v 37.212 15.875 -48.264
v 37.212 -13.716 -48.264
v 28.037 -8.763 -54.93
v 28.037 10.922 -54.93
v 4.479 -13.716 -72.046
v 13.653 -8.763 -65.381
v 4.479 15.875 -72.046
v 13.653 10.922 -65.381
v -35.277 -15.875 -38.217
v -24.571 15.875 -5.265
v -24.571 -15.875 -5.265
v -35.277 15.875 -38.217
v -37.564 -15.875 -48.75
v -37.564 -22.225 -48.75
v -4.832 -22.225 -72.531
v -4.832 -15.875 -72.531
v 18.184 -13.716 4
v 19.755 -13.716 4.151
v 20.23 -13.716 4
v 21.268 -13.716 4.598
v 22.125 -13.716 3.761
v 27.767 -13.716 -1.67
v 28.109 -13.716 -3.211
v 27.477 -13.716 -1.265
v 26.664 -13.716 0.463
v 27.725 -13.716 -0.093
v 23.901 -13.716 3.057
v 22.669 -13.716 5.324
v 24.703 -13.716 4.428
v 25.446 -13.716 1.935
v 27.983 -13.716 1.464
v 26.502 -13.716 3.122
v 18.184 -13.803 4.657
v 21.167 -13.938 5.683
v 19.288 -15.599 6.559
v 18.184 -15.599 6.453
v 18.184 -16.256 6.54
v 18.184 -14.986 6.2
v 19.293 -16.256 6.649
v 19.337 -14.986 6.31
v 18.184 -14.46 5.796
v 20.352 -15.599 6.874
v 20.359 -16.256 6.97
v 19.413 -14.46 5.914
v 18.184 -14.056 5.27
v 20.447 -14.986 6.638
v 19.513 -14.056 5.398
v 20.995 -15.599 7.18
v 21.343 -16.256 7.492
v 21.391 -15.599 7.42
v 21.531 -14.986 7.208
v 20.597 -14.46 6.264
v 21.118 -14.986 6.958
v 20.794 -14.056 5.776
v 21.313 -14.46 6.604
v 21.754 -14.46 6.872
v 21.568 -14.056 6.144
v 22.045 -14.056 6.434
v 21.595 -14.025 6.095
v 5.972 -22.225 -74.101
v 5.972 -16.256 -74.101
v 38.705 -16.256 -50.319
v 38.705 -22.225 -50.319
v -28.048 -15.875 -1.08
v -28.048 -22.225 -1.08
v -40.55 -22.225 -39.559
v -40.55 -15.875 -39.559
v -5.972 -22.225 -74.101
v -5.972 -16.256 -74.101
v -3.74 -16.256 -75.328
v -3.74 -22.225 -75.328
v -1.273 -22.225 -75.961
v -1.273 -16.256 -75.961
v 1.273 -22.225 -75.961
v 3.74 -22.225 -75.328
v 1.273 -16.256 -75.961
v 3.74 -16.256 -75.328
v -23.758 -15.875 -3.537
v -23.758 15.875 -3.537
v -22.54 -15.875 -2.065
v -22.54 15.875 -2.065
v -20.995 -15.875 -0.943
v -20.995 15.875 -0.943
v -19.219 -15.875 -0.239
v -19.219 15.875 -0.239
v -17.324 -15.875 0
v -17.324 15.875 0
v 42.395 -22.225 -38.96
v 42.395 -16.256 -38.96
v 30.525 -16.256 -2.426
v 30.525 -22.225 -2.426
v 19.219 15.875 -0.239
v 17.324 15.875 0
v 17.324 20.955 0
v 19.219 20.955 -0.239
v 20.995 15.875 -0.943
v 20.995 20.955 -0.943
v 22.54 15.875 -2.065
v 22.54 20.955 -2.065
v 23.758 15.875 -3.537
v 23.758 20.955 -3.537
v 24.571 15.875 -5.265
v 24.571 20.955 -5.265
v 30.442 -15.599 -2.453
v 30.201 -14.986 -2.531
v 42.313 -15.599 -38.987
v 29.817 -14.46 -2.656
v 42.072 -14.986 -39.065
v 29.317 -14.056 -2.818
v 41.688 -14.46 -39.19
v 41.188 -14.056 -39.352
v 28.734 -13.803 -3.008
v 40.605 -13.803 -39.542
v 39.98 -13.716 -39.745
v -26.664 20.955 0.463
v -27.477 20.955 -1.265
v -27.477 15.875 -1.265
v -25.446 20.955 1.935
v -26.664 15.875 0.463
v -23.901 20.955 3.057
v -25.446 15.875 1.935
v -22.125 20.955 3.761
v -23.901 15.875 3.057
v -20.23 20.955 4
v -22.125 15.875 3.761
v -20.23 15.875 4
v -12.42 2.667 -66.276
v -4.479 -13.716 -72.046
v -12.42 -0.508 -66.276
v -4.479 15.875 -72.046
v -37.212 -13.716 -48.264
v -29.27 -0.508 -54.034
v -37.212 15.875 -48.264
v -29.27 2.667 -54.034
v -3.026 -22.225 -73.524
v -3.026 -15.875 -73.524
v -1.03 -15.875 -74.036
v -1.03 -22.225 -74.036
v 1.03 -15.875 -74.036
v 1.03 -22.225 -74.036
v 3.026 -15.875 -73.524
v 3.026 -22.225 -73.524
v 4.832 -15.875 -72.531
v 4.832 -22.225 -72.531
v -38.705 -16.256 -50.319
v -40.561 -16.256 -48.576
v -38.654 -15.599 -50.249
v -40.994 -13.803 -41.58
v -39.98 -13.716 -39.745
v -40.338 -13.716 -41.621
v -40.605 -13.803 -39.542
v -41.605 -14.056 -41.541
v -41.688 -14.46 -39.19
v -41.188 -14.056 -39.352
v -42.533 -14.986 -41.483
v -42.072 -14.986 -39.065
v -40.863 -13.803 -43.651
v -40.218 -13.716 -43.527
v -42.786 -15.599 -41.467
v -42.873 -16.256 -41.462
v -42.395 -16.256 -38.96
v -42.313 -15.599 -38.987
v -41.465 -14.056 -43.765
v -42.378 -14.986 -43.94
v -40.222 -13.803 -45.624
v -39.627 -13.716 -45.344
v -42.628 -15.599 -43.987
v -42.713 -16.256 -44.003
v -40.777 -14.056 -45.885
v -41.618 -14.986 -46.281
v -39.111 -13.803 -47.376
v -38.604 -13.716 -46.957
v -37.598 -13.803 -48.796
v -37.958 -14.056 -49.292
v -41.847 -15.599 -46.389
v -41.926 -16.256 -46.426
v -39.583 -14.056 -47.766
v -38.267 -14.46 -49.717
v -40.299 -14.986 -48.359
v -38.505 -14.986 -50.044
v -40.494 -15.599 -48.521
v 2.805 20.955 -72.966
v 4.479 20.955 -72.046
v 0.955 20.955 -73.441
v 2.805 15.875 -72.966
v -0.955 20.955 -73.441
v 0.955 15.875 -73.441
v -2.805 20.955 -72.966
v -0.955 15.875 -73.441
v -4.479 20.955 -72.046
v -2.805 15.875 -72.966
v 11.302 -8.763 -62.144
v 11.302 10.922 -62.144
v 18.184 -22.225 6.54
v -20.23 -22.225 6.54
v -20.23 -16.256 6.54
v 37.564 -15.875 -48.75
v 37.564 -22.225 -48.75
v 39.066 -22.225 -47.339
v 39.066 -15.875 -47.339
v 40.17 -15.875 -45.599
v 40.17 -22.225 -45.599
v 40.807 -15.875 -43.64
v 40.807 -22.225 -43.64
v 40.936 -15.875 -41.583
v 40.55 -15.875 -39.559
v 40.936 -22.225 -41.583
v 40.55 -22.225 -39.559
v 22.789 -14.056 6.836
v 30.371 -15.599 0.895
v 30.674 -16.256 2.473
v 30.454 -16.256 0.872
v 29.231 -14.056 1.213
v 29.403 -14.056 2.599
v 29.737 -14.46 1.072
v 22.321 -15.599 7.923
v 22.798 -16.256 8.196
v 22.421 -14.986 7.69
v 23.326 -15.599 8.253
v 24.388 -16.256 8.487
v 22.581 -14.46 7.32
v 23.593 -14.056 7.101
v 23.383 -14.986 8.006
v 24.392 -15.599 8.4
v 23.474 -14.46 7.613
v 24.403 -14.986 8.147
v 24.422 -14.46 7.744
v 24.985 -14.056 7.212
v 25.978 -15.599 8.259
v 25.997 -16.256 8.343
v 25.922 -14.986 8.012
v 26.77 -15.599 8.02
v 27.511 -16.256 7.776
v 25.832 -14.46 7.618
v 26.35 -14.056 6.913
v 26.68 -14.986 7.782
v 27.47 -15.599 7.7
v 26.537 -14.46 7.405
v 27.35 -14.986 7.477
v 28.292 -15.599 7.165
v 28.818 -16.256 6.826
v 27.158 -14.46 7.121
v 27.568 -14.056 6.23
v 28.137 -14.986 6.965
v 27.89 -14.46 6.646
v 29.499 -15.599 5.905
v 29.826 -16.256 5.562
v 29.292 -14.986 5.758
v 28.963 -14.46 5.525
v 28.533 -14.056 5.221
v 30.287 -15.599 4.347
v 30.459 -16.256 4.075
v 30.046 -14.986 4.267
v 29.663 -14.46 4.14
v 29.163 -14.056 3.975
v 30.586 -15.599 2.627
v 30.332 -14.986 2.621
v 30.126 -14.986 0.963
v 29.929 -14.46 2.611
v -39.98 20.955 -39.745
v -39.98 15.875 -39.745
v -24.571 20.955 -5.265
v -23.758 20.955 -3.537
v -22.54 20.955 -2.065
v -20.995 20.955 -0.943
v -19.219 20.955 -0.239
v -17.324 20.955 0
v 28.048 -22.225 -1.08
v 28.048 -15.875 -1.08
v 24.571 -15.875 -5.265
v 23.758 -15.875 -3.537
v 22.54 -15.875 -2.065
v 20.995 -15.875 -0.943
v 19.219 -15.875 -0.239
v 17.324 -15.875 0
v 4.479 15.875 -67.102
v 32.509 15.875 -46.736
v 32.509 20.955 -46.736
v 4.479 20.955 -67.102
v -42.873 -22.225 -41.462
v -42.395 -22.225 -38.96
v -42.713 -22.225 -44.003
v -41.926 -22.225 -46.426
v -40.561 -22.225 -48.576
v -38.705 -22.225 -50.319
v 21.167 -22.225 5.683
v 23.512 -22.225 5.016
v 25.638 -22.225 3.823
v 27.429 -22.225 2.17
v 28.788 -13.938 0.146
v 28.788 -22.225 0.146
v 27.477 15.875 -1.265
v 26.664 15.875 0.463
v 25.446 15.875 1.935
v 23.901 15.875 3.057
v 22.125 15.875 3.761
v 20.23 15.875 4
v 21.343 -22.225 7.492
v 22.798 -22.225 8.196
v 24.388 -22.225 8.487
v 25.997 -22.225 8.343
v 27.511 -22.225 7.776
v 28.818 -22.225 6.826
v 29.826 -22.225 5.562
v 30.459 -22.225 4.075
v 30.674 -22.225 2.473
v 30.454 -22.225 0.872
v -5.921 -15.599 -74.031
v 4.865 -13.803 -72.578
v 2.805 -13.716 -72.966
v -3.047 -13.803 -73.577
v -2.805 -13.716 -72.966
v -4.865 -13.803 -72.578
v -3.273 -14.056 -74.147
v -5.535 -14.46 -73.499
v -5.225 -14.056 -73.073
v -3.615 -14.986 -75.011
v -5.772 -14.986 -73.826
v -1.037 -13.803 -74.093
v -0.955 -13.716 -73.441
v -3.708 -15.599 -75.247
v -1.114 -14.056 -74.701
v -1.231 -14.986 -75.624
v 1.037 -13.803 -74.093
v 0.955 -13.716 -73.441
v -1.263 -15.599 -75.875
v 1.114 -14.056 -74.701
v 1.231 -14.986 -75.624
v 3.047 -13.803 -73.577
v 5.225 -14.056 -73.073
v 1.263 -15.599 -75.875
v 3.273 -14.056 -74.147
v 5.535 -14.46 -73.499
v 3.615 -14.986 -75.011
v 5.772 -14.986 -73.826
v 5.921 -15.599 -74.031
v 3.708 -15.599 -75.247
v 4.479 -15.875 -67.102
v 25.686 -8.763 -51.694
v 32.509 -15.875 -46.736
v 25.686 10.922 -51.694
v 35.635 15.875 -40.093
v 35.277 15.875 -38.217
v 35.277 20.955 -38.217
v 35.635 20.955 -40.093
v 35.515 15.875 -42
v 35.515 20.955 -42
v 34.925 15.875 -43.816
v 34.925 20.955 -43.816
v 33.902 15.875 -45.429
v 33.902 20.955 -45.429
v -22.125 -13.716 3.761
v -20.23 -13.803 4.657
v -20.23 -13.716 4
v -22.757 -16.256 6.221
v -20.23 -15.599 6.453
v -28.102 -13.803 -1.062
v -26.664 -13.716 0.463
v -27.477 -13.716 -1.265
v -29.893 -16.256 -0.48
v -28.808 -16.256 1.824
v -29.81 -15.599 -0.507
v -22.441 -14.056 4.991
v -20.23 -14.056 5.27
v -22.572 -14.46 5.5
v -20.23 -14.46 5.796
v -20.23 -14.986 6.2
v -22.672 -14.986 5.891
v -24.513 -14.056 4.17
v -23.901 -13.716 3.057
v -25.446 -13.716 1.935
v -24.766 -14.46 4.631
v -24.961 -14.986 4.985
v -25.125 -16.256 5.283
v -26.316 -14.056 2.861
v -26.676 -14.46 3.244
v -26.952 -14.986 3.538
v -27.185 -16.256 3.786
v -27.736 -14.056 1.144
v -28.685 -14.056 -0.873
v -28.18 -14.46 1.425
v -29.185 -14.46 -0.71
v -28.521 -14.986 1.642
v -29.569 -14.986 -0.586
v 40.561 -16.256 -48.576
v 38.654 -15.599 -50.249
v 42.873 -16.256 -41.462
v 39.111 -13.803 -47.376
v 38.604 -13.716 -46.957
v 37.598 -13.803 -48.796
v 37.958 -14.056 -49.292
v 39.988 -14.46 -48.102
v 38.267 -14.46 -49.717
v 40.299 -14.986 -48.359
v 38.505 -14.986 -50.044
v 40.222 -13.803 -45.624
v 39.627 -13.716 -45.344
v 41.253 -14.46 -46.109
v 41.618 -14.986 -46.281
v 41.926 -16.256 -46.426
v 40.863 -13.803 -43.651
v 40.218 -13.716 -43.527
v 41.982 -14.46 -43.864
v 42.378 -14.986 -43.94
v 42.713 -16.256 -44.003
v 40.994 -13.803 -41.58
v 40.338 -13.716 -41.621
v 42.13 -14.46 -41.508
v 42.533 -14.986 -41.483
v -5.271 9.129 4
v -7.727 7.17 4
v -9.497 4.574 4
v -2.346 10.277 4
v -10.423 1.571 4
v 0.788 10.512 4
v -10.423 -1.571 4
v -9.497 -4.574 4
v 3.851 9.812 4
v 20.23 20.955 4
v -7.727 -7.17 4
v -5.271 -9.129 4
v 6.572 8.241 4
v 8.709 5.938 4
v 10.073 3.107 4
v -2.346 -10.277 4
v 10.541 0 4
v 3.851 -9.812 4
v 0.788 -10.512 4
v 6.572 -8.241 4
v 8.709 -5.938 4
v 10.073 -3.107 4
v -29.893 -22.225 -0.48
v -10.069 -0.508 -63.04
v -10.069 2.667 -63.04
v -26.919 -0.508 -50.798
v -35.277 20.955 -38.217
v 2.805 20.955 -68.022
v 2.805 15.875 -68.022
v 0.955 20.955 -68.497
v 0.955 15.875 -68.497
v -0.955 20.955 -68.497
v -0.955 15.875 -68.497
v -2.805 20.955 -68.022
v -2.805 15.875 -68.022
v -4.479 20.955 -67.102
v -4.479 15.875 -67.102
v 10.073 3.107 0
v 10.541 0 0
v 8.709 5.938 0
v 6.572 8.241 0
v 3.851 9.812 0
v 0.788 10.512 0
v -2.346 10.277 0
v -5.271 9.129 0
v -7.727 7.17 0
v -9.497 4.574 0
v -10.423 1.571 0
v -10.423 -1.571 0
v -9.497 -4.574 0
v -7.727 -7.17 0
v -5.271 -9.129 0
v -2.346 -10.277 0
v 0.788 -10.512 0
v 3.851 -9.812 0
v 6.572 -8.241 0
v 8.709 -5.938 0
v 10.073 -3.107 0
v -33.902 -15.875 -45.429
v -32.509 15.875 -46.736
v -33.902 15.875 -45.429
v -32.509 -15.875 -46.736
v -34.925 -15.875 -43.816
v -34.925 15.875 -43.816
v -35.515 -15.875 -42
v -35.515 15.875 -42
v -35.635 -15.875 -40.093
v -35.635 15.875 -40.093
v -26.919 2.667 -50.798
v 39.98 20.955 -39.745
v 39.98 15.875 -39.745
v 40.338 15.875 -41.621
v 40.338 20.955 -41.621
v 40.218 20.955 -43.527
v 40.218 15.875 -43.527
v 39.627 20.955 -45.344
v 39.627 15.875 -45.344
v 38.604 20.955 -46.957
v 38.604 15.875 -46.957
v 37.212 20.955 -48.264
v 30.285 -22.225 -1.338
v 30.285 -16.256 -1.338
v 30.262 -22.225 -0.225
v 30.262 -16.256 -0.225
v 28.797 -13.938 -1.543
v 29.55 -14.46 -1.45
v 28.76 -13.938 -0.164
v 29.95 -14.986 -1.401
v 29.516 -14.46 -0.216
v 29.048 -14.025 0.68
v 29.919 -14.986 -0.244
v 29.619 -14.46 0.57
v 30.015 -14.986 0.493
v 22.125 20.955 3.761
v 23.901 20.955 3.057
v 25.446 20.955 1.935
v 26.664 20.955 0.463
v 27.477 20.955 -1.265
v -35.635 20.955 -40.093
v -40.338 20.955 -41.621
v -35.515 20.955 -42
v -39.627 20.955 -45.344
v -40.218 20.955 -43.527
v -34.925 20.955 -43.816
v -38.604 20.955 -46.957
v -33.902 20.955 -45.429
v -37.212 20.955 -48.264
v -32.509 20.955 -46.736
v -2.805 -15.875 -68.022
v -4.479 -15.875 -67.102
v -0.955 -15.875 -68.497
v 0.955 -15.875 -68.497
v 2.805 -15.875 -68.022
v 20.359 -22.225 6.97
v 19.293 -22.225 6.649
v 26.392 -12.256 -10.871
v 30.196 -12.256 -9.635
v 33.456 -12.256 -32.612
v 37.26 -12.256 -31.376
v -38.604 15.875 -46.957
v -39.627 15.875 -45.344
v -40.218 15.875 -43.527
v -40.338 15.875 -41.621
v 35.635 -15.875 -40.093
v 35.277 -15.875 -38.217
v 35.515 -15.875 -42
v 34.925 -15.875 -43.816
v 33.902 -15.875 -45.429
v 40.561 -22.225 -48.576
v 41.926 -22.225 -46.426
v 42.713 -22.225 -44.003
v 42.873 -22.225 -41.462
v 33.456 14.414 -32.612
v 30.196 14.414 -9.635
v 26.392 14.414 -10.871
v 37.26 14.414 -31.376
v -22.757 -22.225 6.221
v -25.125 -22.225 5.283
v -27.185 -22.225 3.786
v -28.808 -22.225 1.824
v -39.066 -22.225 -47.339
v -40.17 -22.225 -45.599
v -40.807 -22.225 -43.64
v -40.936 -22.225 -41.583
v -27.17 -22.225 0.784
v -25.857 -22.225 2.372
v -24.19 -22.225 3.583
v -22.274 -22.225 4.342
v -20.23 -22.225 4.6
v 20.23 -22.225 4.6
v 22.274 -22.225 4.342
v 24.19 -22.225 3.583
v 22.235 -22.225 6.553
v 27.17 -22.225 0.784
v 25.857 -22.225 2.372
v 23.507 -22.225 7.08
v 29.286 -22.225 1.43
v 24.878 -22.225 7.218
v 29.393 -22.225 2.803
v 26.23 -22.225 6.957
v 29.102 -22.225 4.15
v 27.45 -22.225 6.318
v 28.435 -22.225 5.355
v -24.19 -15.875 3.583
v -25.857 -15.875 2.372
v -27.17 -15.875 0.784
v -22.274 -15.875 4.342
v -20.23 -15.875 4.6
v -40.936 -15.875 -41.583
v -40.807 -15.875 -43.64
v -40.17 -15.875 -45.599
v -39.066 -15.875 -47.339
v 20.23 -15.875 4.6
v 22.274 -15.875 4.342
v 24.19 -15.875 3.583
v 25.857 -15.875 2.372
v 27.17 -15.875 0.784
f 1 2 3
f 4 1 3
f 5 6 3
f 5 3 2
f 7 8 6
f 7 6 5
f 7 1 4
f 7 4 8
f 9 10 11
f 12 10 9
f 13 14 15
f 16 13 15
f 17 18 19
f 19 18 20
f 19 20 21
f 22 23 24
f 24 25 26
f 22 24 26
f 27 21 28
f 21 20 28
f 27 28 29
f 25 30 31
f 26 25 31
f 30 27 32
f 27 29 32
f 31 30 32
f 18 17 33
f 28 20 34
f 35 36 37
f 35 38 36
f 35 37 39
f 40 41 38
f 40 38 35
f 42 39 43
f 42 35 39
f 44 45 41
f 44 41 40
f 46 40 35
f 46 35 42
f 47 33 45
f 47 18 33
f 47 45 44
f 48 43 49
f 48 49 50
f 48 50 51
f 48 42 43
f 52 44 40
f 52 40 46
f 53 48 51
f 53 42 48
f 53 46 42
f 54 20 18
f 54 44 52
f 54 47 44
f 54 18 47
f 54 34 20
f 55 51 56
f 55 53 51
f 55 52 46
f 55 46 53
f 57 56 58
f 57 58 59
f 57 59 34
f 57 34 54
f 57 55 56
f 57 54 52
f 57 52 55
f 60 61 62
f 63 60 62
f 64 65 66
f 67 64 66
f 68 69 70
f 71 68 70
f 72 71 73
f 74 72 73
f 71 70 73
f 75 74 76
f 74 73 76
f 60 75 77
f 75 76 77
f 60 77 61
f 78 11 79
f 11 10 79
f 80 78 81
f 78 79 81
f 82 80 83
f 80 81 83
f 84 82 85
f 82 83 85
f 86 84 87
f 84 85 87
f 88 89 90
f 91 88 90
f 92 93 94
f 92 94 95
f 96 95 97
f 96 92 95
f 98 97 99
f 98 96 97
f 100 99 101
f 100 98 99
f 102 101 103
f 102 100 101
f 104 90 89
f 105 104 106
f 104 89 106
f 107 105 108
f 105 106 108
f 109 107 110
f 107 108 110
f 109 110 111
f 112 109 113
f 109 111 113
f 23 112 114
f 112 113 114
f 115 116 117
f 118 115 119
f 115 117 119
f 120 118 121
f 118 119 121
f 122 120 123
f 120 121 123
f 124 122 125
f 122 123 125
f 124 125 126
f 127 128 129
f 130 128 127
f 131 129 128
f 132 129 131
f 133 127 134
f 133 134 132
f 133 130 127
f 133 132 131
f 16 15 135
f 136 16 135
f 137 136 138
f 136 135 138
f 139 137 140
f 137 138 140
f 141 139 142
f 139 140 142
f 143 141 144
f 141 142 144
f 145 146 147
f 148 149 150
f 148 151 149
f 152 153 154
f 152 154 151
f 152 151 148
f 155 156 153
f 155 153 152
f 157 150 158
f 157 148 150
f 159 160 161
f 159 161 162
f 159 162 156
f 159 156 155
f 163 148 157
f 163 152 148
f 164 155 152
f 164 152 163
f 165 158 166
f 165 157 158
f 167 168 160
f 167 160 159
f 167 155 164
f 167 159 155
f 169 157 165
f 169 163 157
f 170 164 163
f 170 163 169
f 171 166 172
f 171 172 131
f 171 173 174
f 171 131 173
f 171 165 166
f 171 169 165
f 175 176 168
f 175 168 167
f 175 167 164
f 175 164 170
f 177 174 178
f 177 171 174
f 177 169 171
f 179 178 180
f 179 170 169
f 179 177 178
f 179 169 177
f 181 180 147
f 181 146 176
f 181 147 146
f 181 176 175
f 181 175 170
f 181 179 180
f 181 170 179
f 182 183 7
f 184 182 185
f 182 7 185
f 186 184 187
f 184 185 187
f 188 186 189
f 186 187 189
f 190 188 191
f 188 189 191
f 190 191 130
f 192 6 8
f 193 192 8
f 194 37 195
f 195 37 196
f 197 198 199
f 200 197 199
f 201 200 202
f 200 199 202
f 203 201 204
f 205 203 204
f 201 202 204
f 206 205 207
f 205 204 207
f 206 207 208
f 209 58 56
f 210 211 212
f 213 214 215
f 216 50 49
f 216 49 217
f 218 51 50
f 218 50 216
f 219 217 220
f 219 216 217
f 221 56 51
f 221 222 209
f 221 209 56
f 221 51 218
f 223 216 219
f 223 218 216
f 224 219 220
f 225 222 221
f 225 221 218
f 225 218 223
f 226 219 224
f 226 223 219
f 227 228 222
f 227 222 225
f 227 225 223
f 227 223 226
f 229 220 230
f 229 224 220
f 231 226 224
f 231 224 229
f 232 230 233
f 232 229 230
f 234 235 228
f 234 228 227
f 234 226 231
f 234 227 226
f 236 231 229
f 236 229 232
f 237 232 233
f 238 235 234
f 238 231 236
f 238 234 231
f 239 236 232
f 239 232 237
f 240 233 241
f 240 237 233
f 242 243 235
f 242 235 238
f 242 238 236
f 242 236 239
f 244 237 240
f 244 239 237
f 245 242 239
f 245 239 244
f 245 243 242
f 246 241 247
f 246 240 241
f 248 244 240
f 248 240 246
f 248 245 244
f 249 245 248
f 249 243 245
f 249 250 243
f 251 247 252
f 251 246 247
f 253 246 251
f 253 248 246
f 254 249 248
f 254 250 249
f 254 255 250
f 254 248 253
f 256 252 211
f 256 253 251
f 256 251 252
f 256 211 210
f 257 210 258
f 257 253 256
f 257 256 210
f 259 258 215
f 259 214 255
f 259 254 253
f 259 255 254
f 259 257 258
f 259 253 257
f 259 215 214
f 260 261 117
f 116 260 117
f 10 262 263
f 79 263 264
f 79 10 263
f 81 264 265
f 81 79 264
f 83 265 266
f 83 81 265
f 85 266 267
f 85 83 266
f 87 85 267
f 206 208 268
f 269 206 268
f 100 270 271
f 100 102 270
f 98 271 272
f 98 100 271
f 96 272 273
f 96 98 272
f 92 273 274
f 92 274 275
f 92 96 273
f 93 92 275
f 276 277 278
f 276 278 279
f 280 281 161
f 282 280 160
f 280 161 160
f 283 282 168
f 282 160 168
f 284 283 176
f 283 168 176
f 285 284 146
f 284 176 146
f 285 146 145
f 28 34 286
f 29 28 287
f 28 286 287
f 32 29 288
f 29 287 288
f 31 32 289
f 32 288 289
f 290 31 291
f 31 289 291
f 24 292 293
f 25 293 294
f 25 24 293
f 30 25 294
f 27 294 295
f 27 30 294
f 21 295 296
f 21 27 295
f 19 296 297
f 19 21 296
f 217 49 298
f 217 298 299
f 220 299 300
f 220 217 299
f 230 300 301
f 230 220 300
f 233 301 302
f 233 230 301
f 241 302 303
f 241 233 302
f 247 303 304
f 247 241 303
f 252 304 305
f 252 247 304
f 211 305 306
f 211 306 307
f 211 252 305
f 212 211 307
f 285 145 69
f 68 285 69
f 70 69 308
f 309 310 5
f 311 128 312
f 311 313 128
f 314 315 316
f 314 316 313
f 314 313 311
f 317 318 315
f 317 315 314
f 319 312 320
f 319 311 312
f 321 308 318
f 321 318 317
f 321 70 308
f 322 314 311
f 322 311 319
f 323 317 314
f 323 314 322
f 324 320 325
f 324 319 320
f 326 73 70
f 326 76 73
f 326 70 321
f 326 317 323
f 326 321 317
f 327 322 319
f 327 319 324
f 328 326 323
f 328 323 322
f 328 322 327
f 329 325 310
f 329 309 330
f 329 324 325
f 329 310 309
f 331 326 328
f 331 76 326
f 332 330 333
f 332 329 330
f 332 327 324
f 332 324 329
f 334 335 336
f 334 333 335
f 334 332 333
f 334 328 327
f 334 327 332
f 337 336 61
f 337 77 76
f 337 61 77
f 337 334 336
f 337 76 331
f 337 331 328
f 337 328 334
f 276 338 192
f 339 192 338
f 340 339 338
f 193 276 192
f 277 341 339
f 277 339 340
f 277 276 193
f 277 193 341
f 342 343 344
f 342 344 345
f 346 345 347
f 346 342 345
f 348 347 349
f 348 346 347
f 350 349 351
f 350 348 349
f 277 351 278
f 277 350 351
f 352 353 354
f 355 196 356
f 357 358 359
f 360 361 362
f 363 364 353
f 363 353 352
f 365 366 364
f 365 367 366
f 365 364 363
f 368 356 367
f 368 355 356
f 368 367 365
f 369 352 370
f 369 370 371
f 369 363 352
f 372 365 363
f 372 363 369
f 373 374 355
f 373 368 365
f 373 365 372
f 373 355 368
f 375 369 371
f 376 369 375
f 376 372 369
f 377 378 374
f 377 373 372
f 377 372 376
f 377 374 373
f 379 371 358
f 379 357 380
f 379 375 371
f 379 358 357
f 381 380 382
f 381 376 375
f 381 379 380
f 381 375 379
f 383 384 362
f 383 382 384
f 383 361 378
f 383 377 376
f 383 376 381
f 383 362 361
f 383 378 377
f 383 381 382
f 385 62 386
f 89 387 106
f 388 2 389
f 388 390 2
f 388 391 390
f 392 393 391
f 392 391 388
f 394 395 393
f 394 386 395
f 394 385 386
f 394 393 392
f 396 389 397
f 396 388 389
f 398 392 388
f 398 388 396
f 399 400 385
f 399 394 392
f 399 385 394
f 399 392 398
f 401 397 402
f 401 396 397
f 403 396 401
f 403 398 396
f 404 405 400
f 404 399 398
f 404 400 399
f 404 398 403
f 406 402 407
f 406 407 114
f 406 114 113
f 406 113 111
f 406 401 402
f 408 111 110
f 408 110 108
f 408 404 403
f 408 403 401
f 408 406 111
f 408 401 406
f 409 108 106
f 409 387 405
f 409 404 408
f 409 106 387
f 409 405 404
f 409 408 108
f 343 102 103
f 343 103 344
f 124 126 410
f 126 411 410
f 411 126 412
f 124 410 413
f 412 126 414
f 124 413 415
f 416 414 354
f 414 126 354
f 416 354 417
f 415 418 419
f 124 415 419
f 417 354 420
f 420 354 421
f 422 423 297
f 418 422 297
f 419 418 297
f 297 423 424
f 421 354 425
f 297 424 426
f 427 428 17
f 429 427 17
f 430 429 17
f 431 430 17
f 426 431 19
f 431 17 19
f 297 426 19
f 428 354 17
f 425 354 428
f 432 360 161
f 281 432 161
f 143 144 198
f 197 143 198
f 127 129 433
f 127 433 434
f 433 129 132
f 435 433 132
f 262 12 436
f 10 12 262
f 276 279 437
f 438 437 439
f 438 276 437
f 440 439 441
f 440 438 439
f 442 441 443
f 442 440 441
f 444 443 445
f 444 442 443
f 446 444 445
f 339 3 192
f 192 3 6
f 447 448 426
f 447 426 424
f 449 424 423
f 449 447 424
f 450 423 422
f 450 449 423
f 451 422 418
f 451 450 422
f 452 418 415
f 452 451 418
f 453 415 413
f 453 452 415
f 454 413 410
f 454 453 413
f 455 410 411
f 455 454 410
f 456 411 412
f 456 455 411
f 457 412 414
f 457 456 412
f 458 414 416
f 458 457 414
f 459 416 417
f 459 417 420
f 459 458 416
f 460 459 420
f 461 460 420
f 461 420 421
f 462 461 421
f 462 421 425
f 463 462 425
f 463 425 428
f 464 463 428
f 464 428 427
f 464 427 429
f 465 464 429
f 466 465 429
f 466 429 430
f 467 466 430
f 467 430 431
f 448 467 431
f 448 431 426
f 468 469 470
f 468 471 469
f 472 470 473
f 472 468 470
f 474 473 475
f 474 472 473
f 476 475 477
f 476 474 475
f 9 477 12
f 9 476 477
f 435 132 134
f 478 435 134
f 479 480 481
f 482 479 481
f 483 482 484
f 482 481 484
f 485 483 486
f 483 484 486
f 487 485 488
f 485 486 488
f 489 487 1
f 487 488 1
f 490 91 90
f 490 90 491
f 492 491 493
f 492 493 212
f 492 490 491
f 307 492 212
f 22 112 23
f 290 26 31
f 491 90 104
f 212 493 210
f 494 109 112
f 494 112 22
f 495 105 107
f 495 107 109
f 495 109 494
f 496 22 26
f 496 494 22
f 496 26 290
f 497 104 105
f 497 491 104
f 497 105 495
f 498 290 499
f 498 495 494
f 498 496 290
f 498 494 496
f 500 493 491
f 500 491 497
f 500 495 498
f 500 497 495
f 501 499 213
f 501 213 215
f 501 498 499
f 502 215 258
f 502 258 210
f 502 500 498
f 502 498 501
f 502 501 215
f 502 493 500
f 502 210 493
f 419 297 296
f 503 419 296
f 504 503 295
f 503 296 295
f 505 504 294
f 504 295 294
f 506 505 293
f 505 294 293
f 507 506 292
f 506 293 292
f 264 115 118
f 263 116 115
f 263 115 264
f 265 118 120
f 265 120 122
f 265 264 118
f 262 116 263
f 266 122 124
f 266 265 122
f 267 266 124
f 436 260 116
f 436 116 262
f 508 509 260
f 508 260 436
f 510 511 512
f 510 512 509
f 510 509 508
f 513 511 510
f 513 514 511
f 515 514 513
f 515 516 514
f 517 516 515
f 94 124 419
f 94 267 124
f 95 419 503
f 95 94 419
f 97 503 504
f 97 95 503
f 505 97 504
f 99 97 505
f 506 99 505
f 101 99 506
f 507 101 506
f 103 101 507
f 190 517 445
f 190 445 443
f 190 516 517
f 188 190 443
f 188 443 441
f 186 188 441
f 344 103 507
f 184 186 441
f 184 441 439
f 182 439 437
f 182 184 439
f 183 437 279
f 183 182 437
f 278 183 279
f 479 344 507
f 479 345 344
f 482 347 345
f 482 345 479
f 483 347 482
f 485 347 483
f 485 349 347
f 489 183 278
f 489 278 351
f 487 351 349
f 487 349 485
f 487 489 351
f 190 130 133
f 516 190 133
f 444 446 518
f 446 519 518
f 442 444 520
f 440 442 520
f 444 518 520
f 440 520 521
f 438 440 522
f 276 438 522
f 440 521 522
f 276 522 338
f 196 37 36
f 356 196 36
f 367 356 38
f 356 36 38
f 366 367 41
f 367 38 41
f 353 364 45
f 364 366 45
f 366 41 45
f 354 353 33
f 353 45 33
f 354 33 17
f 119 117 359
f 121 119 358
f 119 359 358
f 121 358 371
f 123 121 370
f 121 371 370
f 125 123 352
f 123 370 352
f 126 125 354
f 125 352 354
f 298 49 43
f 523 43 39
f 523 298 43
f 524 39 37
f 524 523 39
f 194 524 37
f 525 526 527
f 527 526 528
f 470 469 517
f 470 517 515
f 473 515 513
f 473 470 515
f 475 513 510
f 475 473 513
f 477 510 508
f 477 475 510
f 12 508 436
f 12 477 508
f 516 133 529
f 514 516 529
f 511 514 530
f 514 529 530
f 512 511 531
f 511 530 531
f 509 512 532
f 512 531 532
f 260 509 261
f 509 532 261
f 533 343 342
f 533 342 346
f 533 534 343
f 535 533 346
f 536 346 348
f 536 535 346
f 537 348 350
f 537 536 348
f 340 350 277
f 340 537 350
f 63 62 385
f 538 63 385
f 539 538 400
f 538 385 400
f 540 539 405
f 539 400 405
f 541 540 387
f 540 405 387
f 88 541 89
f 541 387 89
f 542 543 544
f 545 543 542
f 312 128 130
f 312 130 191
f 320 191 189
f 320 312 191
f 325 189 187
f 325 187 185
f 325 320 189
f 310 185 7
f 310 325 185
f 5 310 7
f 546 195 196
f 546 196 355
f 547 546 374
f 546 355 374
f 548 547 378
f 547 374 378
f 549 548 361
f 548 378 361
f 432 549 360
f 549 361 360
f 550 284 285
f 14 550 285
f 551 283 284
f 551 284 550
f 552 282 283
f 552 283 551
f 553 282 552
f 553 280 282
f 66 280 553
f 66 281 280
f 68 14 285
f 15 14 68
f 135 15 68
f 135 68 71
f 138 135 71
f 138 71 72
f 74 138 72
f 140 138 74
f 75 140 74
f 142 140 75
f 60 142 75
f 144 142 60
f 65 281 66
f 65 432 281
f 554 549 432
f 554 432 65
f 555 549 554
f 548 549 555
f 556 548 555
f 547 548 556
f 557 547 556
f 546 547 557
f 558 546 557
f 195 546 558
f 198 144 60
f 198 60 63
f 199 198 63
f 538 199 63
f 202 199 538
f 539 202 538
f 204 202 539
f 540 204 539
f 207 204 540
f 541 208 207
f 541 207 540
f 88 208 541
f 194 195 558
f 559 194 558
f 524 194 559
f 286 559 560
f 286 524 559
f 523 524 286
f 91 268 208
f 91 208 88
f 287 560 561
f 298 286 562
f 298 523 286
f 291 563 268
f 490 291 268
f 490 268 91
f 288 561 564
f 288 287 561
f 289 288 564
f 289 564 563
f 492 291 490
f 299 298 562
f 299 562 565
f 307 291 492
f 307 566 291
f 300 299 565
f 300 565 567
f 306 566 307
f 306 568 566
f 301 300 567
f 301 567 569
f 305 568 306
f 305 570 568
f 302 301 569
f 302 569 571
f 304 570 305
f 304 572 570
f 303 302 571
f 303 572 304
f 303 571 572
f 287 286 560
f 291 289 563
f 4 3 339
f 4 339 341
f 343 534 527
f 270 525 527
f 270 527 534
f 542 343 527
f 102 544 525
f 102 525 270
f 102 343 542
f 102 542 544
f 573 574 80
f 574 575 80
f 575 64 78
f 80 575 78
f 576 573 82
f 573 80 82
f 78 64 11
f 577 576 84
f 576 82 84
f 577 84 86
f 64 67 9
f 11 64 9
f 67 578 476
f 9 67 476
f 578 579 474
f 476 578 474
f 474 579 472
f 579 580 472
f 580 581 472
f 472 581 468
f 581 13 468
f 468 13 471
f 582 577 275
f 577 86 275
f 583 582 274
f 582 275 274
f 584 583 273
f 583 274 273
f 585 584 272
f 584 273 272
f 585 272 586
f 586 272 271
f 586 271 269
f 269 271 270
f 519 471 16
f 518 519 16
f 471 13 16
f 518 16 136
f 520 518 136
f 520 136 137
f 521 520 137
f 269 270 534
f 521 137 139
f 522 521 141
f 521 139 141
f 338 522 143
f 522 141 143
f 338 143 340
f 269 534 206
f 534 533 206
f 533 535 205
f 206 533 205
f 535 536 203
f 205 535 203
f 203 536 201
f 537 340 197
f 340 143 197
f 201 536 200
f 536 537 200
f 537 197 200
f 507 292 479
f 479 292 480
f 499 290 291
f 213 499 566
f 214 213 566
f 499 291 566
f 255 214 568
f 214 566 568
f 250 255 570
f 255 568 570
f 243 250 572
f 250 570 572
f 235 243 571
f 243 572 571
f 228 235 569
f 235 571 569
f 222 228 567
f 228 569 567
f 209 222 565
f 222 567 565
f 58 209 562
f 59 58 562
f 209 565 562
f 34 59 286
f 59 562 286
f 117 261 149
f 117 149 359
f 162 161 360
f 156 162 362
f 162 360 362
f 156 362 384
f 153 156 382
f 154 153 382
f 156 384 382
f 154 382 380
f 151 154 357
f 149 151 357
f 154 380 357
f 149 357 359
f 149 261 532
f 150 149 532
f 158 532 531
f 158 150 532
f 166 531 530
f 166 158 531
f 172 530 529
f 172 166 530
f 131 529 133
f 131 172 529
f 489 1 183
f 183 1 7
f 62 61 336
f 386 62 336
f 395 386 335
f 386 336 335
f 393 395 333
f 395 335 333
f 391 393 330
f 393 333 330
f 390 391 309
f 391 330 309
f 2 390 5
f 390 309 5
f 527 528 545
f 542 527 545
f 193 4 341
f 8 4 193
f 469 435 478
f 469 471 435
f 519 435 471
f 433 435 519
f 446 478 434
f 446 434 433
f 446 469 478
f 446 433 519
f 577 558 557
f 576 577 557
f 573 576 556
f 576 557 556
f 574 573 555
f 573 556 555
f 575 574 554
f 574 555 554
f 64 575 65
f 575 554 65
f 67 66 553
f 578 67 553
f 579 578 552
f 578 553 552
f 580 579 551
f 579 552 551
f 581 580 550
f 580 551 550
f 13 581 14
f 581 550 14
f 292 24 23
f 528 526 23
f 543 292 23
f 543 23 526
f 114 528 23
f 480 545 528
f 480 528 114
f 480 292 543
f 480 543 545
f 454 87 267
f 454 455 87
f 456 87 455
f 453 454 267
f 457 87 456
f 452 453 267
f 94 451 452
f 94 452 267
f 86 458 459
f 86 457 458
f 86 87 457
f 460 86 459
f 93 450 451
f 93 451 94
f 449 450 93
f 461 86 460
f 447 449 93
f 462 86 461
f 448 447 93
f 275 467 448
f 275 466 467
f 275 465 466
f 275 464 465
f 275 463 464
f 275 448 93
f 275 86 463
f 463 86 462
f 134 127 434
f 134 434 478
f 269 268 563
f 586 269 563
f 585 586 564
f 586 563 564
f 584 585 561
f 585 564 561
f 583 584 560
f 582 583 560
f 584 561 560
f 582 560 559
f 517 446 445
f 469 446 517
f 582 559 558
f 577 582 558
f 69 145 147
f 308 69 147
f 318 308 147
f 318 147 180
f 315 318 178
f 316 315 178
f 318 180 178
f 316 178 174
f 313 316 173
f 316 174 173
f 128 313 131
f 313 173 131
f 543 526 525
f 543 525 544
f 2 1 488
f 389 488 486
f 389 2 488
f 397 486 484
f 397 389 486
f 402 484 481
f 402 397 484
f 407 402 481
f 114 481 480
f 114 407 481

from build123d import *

# Parameters (mm, degrees)
SKETCH1_W                = 45.72
SKETCH1_H                = 31.75
SKETCH1_R                = 10.16
BOSS_EXTRUDE1_DEPTH      = 4
BOSS_EXTRUDE2_DEPTH      = 31.75
FILLET1_R                = 7.62
BOSS_EXTRUDE3_DEPTH      = 5.08
BOSS_EXTRUDE4_DEPTH      = 6.35
BOSS_EXTRUDE4_DEPTH_BACK = 2.159
BOSS_EXTRUDE5_START      = -8.509
BOSS_EXTRUDE5_DEPTH      = 8.509
CUT_EXTRUDE4_DEPTH       = 12.192
FILLET5_R                = 5.715
FILLET6_R                = 2.54
CUT_EXTRUDE5_DEPTH       = 6.35
SKETCH14_W               = 22.86
SKETCH14_H               = 26.67
CUT_EXTRUDE6_DEPTH       = 10.16
SKETCH15_W               = 17.78
SKETCH15_H               = 19.685
CUT_EXTRUDE7_DEPTH       = 10.16
SKETCH16_W               = 20.828
SKETCH16_H               = 3.175
CUT_EXTRUDE8_DEPTH       = 10.16
CUT_EXTRUDE9_START       = -9.398
SKETCH17_R               = 10.541
SKETCH17_R_2             = 10.16
CUT_EXTRUDE9_DEPTH       = 9.398


with BuildPart() as part:
    # Sketch1 → Boss-Extrude1 (new body)
    with BuildSketch(Plane.XY):
        Rectangle(SKETCH1_W, SKETCH1_H)
        Circle(SKETCH1_R, mode=Mode.SUBTRACT)
    extrude(amount=BOSS_EXTRUDE1_DEPTH)

    # Sketch2 → Boss-Extrude2 (add)
    with BuildSketch(Plane(origin=(0, 15.875, 0), x_dir=(1, 0, 0), z_dir=(0, 1, 0))):
        Polygon((36.988256983, 43.482303925), (22.86, 0), (22.86, -4), (25.766170112, -4), (41.690539001, 45.01016797), (0, 75.30011757), (-41.690539001, 45.01016797), (-25.766170112, -4), (-22.86, -4), (-22.86, 0), (-36.988256983, 43.482303925), (0, 70.35584566), align=None)
    extrude(amount=-BOSS_EXTRUDE2_DEPTH)

    # Fillet1
    fillet1_edges = [part.edges().sort_by_distance(p)[0] for p in [
        (0, 0, -75.30011757),
        (41.690539001, 0, -45.01016797),
        (25.766170112, 0, 4),
        (36.988256983, 0, -43.482303925),
        (0, 0, -70.35584566),
        (-36.988256983, 0, -43.482303925),
        (-25.766170112, 0, 4),
        (-41.690539001, 0, -45.01016797),
        (-22.86, 0, 0),
        (22.86, 0, 0),
    ]]
    fillet(fillet1_edges, radius=FILLET1_R)

    # Sketch6 → Boss-Extrude3 (add)
    with BuildSketch(Plane(origin=(0, 15.875, 0), x_dir=(1, 0, 0), z_dir=(0, 1, 0))):
        with BuildLine():
            Line((-20.229916049, -4), (20.229916049, -4))
            ThreePointArc((20.229916049, -4), (24.708839671, -2.544709497), (27.476966703, 1.265290503))
            Line((27.476966703, 1.265290503), (39.97974241, 39.744877467))
            ThreePointArc((39.97974241, 39.744877467), (39.97974241, 44.454296461), (37.211615379, 48.264296461))
            Line((37.211615379, 48.264296461), (4.478923622, 72.045989078))
            ThreePointArc((4.478923622, 72.045989078), (0, 73.501279581), (-4.478923622, 72.045989078))
            Line((-4.478923622, 72.045989078), (-37.211615379, 48.264296461))
            ThreePointArc((-37.211615379, 48.264296461), (-39.97974241, 44.454296461), (-39.97974241, 39.744877467))
            Line((-39.97974241, 39.744877467), (-27.476966703, 1.265290503))
            ThreePointArc((-27.476966703, 1.265290503), (-24.708839671, -2.544709497), (-20.229916049, -4))
        make_face()
        with BuildLine():
            Line((24.570796591, 5.265290503), (35.277460392, 38.217013422))
            ThreePointArc((35.277460392, 38.217013422), (35.277460392, 42.926432416), (32.50933336, 46.736432416))
            Line((32.50933336, 46.736432416), (4.478923622, 67.101717168))
            ThreePointArc((4.478923622, 67.101717168), (0, 68.557007671), (-4.478923622, 67.101717168))
            Line((-4.478923622, 67.101717168), (-32.50933336, 46.736432416))
            ThreePointArc((-32.50933336, 46.736432416), (-35.277460392, 42.926432416), (-35.277460392, 38.217013422))
            Line((-35.277460392, 38.217013422), (-24.570796591, 5.265290503))
            ThreePointArc((-24.570796591, 5.265290503), (-21.802669559, 1.455290503), (-17.323745937, 0))
            Line((-17.323745937, 0), (17.323745937, 0))
            ThreePointArc((17.323745937, 0), (21.802669559, 1.455290503), (24.570796591, 5.265290503))
        make_face(mode=Mode.SUBTRACT)
    extrude(amount=BOSS_EXTRUDE3_DEPTH)

    # Sketch8 → Boss-Extrude4 (add, two sides: drawn at the far end of the back side and taken through both)
    with BuildSketch(Plane.XZ.offset(15.875).offset(-BOSS_EXTRUDE4_DEPTH_BACK)):
        with BuildLine():
            Line((5.971898163, -74.100892244), (38.70458992, -50.319199627))
            ThreePointArc((38.70458992, -50.319199627), (42.395425962, -45.239199627), (42.395425962, -38.959974301))
            Line((42.395425962, -38.959974301), (29.892650254, -0.480387337))
            ThreePointArc((29.892650254, -0.480387337), (26.201814212, 4.599612663), (20.229916049, 6.54))
            Line((20.229916049, 6.54), (-20.229916049, 6.54))
            ThreePointArc((-20.229916049, 6.54), (-26.201814212, 4.599612663), (-29.892650254, -0.480387337))
            Line((-29.892650254, -0.480387337), (-42.395425962, -38.959974301))
            ThreePointArc((-42.395425962, -38.959974301), (-42.395425962, -45.239199627), (-38.70458992, -50.319199627))
            Line((-38.70458992, -50.319199627), (-5.971898163, -74.100892244))
            ThreePointArc((-5.971898163, -74.100892244), (0, -76.041279581), (5.971898163, -74.100892244))
        make_face()
        with BuildLine():
            Line((39.97974241, -39.744877467), (27.476966703, -1.265290503))
            ThreePointArc((27.476966703, -1.265290503), (24.708839671, 2.544709497), (20.229916049, 4))
            Line((20.229916049, 4), (-20.229916049, 4))
            ThreePointArc((-20.229916049, 4), (-24.708839671, 2.544709497), (-27.476966703, -1.265290503))
            Line((-27.476966703, -1.265290503), (-39.97974241, -39.744877467))
            ThreePointArc((-39.97974241, -39.744877467), (-39.97974241, -44.454296461), (-37.211615379, -48.264296461))
            Line((-37.211615379, -48.264296461), (-4.478923622, -72.045989078))
            ThreePointArc((-4.478923622, -72.045989078), (0, -73.501279581), (4.478923622, -72.045989078))
            Line((4.478923622, -72.045989078), (37.211615379, -48.264296461))
            ThreePointArc((37.211615379, -48.264296461), (39.97974241, -44.454296461), (39.97974241, -39.744877467))
        make_face(mode=Mode.SUBTRACT)
    extrude(amount=BOSS_EXTRUDE4_DEPTH + BOSS_EXTRUDE4_DEPTH_BACK)

    # Sketch11 → Boss-Extrude5 (add)
    with BuildSketch(Plane.XZ.offset(22.225).offset(BOSS_EXTRUDE5_START)):
        with BuildLine():
            Line((19.948787859, 5.414930333), (27.190045273, 1.56775587))
            Line((27.190045273, 1.56775587), (29.892650254, -0.480387337))
            ThreePointArc((29.892650254, -0.480387337), (26.201814212, 4.599612663), (20.229916049, 6.54))
            Line((20.229916049, 6.54), (19.948787859, 5.414930333))
        make_face()
        with BuildLine():
            ThreePointArc((20.229916049, 6.54), (28.196740294, 7.345392854), (29.892650254, -0.480387337))
            ThreePointArc((29.892650254, -0.480387337), (26.201814212, 4.599612663), (20.229916049, 6.54))
        make_face()
    extrude(amount=BOSS_EXTRUDE5_DEPTH)

    # Sketch12 → Cut-Extrude4 (cut)
    with BuildSketch(Plane.XZ.offset(22.225)):
        with BuildLine():
            ThreePointArc((28.787792432, 0.145862767), (27.450253023, 6.317941272), (21.166935135, 5.682739694))
            ThreePointArc((21.166935135, 5.682739694), (25.637505825, 3.822908801), (28.787792432, 0.145862767))
        make_face()
    extrude(amount=-CUT_EXTRUDE4_DEPTH, mode=Mode.SUBTRACT)

    # Fillet5
    fillet5_edges = [part.edges().sort_by_distance(p)[0] for p in [
        (20.229916049, -17.9705, 6.54),
        (29.892650254, -17.9705, -0.480387337),
    ]]
    fillet(fillet5_edges, radius=FILLET5_R)

    # Fillet6
    # the kernel refuses this fillet: 2.54 mm, written as the material it takes off along each edge
    with BuildSketch(Plane(origin=(32.732691756, -13.716, -42.099586964), x_dir=(0.5877852522924708, 0, -0.809016994374949), z_dir=(-0.809016994374949, 0, -0.5877852522924708))) as fillet6_piece_1:
        with BuildLine():
            CenterArc((10.16 - FILLET6_R, FILLET6_R), FILLET6_R, 270, 90)
            Line((10.16 - FILLET6_R, 0), (10.16, 0))
            Line((10.16, 0), (10.16, FILLET6_R))
        make_face()
    revolve(axis=Axis((32.732691756, -13.716, -42.099586964), (0, -1, 0)), revolution_arc=72, mode=Mode.SUBTRACT)
    with BuildSketch(Plane(origin=(5.971898163, -13.716, -74.100892244), x_dir=(0, -1, 0), z_dir=(0.8090169943749487, 0, 0.5877852522924716)), Plane(origin=(-38.70458992, -13.716, -50.319199627), x_dir=(0, -1, 0), z_dir=(0.8090169943749469, 0, -0.5877852522924739)), Plane(origin=(-29.892650254, -13.716, -0.480387337), x_dir=(0, -1, 0), z_dir=(-0.3090169943749508, 0, -0.9510565162951525))) as fillet6_piece_2:
        with BuildLine():
            CenterArc((FILLET6_R, -FILLET6_R), FILLET6_R, 90, 90)
            Line((0, -FILLET6_R), (0, 0))
            Line((0, 0), (FILLET6_R, 0))
        make_face()
    extrude(amount=40.459832097, mode=Mode.SUBTRACT)
    with BuildSketch(Plane(origin=(0, -13.716, -65.881279581), x_dir=(-0.5877852522924719, 0, -0.8090169943749482), z_dir=(-0.8090169943749482, 0, 0.5877852522924719))) as fillet6_piece_3:
        with BuildLine():
            CenterArc((10.16 - FILLET6_R, FILLET6_R), FILLET6_R, 270, 90)
            Line((10.16 - FILLET6_R, 0), (10.16, 0))
            Line((10.16, 0), (10.16, FILLET6_R))
        make_face()
    revolve(axis=Axis((0, -13.716, -65.881279581), (0, -1, 0)), revolution_arc=72, mode=Mode.SUBTRACT)
    with BuildSketch(Plane(origin=(-32.732691756, -13.716, -42.099586964), x_dir=(-0.9510565162951536, 0, 0.30901699437494734), z_dir=(0.30901699437494734, 0, 0.9510565162951536))) as fillet6_piece_4:
        with BuildLine():
            CenterArc((10.16 - FILLET6_R, FILLET6_R), FILLET6_R, 270, 90)
            Line((10.16 - FILLET6_R, 0), (10.16, 0))
            Line((10.16, 0), (10.16, FILLET6_R))
        make_face()
    revolve(axis=Axis((-32.732691756, -13.716, -42.099586964), (0, -1, 0)), revolution_arc=72, mode=Mode.SUBTRACT)
    with BuildSketch(Plane(origin=(-20.229916049, -13.716, -3.62), x_dir=(0, 0, 1), z_dir=(1, 0, 0))) as fillet6_piece_5:
        with BuildLine():
            CenterArc((10.16 - FILLET6_R, FILLET6_R), FILLET6_R, 270, 90)
            Line((10.16 - FILLET6_R, 0), (10.16, 0))
            Line((10.16, 0), (10.16, FILLET6_R))
        make_face()
    revolve(axis=Axis((-20.229916049, -13.716, -3.62), (0, -1, 0)), revolution_arc=72, mode=Mode.SUBTRACT)
    with BuildSketch(Plane(origin=(18.184374257, -13.716, 6.54), x_dir=(0, -1, 0), z_dir=(-1, 0, 0)), Plane(origin=(42.395425962, -13.716, -38.959974301), x_dir=(0, -1, 0), z_dir=(-0.30901699437494484, 0, 0.9510565162951544))) as fillet6_piece_6:
        with BuildLine():
            CenterArc((FILLET6_R, -FILLET6_R), FILLET6_R, 90, 90)
            Line((0, -FILLET6_R), (0, 0))
            Line((0, 0), (FILLET6_R, 0))
        make_face()
    extrude(amount=38.414290306, mode=Mode.SUBTRACT)
    with BuildSketch(Plane(origin=(18.184374257, -13.716, 12.255), x_dir=(0, 0, -1), z_dir=(-1, 0, 0))) as fillet6_piece_7:
        with BuildLine():
            CenterArc((5.715 + FILLET6_R, FILLET6_R), FILLET6_R, 180, 90)
            Line((5.715 + FILLET6_R, 0), (5.715, 0))
            Line((5.715, 0), (5.715, FILLET6_R))
        make_face()
    revolve(axis=Axis((18.184374257, -13.716, 12.255), (0, -1, 0)), revolution_arc=33.548768752, mode=Mode.SUBTRACT)
    with BuildSketch(Plane(origin=(35.960045421, -13.716, -0.659781065), x_dir=(-0.9510565162951543, 0, -0.30901699437494495), z_dir=(0.30901699437494495, 0, -0.9510565162951543))) as fillet6_piece_8:
        with BuildLine():
            CenterArc((5.715 + FILLET6_R, -FILLET6_R), FILLET6_R, 90, 90)
            Line((5.715 + FILLET6_R, 0), (5.715, 0))
            Line((5.715, 0), (5.715, -FILLET6_R))
        make_face()
    revolve(axis=Axis((35.960045421, -13.716, -0.659781065), (0, 1, 0)), revolution_arc=33.548768752, mode=Mode.SUBTRACT)
    with BuildSketch(Plane(origin=(24.664153166, -13.716, 2.483203799), x_dir=(-0.5526465683039513, 0, 0.8334157249187624), z_dir=(-0.8334157249187624, 0, -0.5526465683039513))) as fillet6_piece_9:
        with BuildLine():
            CenterArc((6.009996192 - FILLET6_R, -FILLET6_R), FILLET6_R, 0, 90)
            Line((6.009996192 - FILLET6_R, 0), (6.009996192, 0))
            Line((6.009996192, 0), (6.009996192, -FILLET6_R))
        make_face()
    revolve(axis=Axis((24.664153166, -13.716, 2.483203799), (0, 1, 0)), revolution_arc=139.097537505, mode=Mode.SUBTRACT)

    # Sketch13 → Cut-Extrude5 (cut)
    # profile 1 of 2: a face of its own
    with BuildSketch(Plane.XZ.offset(22.225)):
        with BuildLine():
            Line((20.229916049, 4.6), (-20.229916049, 4.6))
            ThreePointArc((-20.229916049, 4.6), (-25.061510822, 3.030119694), (-28.047600613, -1.079880306))
            Line((-28.047600613, -1.079880306), (-40.55037632, -39.559467271))
            ThreePointArc((-40.55037632, -39.559467271), (-40.55037632, -44.639706658), (-37.56428653, -48.749706658))
            Line((-37.56428653, -48.749706658), (-4.831594774, -72.531399275))
            ThreePointArc((-4.831594774, -72.531399275), (0, -74.101279581), (4.831594774, -72.531399275))
            Line((4.831594774, -72.531399275), (37.56428653, -48.749706658))
            ThreePointArc((37.56428653, -48.749706658), (40.55037632, -44.639706658), (40.55037632, -39.559467271))
            Line((40.55037632, -39.559467271), (28.047600613, -1.079880306))
            ThreePointArc((28.047600613, -1.079880306), (25.061510822, 3.030119694), (20.229916049, 4.6))
        make_face()
        with BuildLine():
            Line((39.97974241, -39.744877467), (27.476966703, -1.265290503))
            ThreePointArc((27.476966703, -1.265290503), (24.708839671, 2.544709497), (20.229916049, 4))
            Line((20.229916049, 4), (-20.229916049, 4))
            ThreePointArc((-20.229916049, 4), (-24.708839671, 2.544709497), (-27.476966703, -1.265290503))
            Line((-27.476966703, -1.265290503), (-39.97974241, -39.744877467))
            ThreePointArc((-39.97974241, -39.744877467), (-39.97974241, -44.454296461), (-37.211615379, -48.264296461))
            Line((-37.211615379, -48.264296461), (-4.478923622, -72.045989078))
            ThreePointArc((-4.478923622, -72.045989078), (0, -73.501279581), (4.478923622, -72.045989078))
            Line((4.478923622, -72.045989078), (37.211615379, -48.264296461))
            ThreePointArc((37.211615379, -48.264296461), (39.97974241, -44.454296461), (39.97974241, -39.744877467))
        make_face(mode=Mode.SUBTRACT)
    # profile 2 of 2: a face of its own
    with BuildSketch(Plane.XZ.offset(22.225)):
        with BuildLine():
            ThreePointArc((28.787792432, 0.145862767), (27.450253023, 6.317941272), (21.166935135, 5.682739694))
            ThreePointArc((21.166935135, 5.682739694), (25.637505825, 3.822908801), (28.787792432, 0.145862767))
        make_face()
    extrude(amount=-CUT_EXTRUDE5_DEPTH, mode=Mode.SUBTRACT)

    # Sketch14 → Cut-Extrude6 (cut)
    with BuildSketch(Plane(origin=(24.481290311, 0, 7.954453411), x_dir=(0.30901699437494484, 0, -0.9510565162951544), z_dir=(0.9510565162951544, 0, 0.30901699437494484))):
        with Locations((29.924128491, 1.0795)):
            Rectangle(SKETCH14_W, SKETCH14_H)
    extrude(amount=-CUT_EXTRUDE6_DEPTH, mode=Mode.SUBTRACT)

    # Sketch15 → Cut-Extrude7 (cut)
    with BuildSketch(Plane(origin=(35.807333746, 0, -49.284566789), x_dir=(-0.8090169943749486, 0, -0.5877852522924718), z_dir=(0.5877852522924718, 0, -0.8090169943749486))):
        with Locations((18.494128491, 1.0795)):
            Rectangle(SKETCH15_W, SKETCH15_H)
    extrude(amount=-CUT_EXTRUDE7_DEPTH, mode=Mode.SUBTRACT)

    # Sketch16 → Cut-Extrude8 (cut)
    with BuildSketch(Plane(origin=(-35.807333746, 0, -49.284566789), x_dir=(-0.8090169943749469, 0, 0.5877852522924738), z_dir=(-0.5877852522924738, 0, -0.8090169943749469))):
        with Locations((-18.494128491, 1.0795)):
            Rectangle(SKETCH16_W, SKETCH16_H)
    extrude(amount=-CUT_EXTRUDE8_DEPTH, mode=Mode.SUBTRACT)

    # Sketch17 → Cut-Extrude9 (cut)
    with BuildSketch(Plane.XY.offset(4).offset(CUT_EXTRUDE9_START)):
        Circle(SKETCH17_R)
        Circle(SKETCH17_R_2, mode=Mode.SUBTRACT)
    extrude(amount=CUT_EXTRUDE9_DEPTH, mode=Mode.SUBTRACT)


solid = part.part
